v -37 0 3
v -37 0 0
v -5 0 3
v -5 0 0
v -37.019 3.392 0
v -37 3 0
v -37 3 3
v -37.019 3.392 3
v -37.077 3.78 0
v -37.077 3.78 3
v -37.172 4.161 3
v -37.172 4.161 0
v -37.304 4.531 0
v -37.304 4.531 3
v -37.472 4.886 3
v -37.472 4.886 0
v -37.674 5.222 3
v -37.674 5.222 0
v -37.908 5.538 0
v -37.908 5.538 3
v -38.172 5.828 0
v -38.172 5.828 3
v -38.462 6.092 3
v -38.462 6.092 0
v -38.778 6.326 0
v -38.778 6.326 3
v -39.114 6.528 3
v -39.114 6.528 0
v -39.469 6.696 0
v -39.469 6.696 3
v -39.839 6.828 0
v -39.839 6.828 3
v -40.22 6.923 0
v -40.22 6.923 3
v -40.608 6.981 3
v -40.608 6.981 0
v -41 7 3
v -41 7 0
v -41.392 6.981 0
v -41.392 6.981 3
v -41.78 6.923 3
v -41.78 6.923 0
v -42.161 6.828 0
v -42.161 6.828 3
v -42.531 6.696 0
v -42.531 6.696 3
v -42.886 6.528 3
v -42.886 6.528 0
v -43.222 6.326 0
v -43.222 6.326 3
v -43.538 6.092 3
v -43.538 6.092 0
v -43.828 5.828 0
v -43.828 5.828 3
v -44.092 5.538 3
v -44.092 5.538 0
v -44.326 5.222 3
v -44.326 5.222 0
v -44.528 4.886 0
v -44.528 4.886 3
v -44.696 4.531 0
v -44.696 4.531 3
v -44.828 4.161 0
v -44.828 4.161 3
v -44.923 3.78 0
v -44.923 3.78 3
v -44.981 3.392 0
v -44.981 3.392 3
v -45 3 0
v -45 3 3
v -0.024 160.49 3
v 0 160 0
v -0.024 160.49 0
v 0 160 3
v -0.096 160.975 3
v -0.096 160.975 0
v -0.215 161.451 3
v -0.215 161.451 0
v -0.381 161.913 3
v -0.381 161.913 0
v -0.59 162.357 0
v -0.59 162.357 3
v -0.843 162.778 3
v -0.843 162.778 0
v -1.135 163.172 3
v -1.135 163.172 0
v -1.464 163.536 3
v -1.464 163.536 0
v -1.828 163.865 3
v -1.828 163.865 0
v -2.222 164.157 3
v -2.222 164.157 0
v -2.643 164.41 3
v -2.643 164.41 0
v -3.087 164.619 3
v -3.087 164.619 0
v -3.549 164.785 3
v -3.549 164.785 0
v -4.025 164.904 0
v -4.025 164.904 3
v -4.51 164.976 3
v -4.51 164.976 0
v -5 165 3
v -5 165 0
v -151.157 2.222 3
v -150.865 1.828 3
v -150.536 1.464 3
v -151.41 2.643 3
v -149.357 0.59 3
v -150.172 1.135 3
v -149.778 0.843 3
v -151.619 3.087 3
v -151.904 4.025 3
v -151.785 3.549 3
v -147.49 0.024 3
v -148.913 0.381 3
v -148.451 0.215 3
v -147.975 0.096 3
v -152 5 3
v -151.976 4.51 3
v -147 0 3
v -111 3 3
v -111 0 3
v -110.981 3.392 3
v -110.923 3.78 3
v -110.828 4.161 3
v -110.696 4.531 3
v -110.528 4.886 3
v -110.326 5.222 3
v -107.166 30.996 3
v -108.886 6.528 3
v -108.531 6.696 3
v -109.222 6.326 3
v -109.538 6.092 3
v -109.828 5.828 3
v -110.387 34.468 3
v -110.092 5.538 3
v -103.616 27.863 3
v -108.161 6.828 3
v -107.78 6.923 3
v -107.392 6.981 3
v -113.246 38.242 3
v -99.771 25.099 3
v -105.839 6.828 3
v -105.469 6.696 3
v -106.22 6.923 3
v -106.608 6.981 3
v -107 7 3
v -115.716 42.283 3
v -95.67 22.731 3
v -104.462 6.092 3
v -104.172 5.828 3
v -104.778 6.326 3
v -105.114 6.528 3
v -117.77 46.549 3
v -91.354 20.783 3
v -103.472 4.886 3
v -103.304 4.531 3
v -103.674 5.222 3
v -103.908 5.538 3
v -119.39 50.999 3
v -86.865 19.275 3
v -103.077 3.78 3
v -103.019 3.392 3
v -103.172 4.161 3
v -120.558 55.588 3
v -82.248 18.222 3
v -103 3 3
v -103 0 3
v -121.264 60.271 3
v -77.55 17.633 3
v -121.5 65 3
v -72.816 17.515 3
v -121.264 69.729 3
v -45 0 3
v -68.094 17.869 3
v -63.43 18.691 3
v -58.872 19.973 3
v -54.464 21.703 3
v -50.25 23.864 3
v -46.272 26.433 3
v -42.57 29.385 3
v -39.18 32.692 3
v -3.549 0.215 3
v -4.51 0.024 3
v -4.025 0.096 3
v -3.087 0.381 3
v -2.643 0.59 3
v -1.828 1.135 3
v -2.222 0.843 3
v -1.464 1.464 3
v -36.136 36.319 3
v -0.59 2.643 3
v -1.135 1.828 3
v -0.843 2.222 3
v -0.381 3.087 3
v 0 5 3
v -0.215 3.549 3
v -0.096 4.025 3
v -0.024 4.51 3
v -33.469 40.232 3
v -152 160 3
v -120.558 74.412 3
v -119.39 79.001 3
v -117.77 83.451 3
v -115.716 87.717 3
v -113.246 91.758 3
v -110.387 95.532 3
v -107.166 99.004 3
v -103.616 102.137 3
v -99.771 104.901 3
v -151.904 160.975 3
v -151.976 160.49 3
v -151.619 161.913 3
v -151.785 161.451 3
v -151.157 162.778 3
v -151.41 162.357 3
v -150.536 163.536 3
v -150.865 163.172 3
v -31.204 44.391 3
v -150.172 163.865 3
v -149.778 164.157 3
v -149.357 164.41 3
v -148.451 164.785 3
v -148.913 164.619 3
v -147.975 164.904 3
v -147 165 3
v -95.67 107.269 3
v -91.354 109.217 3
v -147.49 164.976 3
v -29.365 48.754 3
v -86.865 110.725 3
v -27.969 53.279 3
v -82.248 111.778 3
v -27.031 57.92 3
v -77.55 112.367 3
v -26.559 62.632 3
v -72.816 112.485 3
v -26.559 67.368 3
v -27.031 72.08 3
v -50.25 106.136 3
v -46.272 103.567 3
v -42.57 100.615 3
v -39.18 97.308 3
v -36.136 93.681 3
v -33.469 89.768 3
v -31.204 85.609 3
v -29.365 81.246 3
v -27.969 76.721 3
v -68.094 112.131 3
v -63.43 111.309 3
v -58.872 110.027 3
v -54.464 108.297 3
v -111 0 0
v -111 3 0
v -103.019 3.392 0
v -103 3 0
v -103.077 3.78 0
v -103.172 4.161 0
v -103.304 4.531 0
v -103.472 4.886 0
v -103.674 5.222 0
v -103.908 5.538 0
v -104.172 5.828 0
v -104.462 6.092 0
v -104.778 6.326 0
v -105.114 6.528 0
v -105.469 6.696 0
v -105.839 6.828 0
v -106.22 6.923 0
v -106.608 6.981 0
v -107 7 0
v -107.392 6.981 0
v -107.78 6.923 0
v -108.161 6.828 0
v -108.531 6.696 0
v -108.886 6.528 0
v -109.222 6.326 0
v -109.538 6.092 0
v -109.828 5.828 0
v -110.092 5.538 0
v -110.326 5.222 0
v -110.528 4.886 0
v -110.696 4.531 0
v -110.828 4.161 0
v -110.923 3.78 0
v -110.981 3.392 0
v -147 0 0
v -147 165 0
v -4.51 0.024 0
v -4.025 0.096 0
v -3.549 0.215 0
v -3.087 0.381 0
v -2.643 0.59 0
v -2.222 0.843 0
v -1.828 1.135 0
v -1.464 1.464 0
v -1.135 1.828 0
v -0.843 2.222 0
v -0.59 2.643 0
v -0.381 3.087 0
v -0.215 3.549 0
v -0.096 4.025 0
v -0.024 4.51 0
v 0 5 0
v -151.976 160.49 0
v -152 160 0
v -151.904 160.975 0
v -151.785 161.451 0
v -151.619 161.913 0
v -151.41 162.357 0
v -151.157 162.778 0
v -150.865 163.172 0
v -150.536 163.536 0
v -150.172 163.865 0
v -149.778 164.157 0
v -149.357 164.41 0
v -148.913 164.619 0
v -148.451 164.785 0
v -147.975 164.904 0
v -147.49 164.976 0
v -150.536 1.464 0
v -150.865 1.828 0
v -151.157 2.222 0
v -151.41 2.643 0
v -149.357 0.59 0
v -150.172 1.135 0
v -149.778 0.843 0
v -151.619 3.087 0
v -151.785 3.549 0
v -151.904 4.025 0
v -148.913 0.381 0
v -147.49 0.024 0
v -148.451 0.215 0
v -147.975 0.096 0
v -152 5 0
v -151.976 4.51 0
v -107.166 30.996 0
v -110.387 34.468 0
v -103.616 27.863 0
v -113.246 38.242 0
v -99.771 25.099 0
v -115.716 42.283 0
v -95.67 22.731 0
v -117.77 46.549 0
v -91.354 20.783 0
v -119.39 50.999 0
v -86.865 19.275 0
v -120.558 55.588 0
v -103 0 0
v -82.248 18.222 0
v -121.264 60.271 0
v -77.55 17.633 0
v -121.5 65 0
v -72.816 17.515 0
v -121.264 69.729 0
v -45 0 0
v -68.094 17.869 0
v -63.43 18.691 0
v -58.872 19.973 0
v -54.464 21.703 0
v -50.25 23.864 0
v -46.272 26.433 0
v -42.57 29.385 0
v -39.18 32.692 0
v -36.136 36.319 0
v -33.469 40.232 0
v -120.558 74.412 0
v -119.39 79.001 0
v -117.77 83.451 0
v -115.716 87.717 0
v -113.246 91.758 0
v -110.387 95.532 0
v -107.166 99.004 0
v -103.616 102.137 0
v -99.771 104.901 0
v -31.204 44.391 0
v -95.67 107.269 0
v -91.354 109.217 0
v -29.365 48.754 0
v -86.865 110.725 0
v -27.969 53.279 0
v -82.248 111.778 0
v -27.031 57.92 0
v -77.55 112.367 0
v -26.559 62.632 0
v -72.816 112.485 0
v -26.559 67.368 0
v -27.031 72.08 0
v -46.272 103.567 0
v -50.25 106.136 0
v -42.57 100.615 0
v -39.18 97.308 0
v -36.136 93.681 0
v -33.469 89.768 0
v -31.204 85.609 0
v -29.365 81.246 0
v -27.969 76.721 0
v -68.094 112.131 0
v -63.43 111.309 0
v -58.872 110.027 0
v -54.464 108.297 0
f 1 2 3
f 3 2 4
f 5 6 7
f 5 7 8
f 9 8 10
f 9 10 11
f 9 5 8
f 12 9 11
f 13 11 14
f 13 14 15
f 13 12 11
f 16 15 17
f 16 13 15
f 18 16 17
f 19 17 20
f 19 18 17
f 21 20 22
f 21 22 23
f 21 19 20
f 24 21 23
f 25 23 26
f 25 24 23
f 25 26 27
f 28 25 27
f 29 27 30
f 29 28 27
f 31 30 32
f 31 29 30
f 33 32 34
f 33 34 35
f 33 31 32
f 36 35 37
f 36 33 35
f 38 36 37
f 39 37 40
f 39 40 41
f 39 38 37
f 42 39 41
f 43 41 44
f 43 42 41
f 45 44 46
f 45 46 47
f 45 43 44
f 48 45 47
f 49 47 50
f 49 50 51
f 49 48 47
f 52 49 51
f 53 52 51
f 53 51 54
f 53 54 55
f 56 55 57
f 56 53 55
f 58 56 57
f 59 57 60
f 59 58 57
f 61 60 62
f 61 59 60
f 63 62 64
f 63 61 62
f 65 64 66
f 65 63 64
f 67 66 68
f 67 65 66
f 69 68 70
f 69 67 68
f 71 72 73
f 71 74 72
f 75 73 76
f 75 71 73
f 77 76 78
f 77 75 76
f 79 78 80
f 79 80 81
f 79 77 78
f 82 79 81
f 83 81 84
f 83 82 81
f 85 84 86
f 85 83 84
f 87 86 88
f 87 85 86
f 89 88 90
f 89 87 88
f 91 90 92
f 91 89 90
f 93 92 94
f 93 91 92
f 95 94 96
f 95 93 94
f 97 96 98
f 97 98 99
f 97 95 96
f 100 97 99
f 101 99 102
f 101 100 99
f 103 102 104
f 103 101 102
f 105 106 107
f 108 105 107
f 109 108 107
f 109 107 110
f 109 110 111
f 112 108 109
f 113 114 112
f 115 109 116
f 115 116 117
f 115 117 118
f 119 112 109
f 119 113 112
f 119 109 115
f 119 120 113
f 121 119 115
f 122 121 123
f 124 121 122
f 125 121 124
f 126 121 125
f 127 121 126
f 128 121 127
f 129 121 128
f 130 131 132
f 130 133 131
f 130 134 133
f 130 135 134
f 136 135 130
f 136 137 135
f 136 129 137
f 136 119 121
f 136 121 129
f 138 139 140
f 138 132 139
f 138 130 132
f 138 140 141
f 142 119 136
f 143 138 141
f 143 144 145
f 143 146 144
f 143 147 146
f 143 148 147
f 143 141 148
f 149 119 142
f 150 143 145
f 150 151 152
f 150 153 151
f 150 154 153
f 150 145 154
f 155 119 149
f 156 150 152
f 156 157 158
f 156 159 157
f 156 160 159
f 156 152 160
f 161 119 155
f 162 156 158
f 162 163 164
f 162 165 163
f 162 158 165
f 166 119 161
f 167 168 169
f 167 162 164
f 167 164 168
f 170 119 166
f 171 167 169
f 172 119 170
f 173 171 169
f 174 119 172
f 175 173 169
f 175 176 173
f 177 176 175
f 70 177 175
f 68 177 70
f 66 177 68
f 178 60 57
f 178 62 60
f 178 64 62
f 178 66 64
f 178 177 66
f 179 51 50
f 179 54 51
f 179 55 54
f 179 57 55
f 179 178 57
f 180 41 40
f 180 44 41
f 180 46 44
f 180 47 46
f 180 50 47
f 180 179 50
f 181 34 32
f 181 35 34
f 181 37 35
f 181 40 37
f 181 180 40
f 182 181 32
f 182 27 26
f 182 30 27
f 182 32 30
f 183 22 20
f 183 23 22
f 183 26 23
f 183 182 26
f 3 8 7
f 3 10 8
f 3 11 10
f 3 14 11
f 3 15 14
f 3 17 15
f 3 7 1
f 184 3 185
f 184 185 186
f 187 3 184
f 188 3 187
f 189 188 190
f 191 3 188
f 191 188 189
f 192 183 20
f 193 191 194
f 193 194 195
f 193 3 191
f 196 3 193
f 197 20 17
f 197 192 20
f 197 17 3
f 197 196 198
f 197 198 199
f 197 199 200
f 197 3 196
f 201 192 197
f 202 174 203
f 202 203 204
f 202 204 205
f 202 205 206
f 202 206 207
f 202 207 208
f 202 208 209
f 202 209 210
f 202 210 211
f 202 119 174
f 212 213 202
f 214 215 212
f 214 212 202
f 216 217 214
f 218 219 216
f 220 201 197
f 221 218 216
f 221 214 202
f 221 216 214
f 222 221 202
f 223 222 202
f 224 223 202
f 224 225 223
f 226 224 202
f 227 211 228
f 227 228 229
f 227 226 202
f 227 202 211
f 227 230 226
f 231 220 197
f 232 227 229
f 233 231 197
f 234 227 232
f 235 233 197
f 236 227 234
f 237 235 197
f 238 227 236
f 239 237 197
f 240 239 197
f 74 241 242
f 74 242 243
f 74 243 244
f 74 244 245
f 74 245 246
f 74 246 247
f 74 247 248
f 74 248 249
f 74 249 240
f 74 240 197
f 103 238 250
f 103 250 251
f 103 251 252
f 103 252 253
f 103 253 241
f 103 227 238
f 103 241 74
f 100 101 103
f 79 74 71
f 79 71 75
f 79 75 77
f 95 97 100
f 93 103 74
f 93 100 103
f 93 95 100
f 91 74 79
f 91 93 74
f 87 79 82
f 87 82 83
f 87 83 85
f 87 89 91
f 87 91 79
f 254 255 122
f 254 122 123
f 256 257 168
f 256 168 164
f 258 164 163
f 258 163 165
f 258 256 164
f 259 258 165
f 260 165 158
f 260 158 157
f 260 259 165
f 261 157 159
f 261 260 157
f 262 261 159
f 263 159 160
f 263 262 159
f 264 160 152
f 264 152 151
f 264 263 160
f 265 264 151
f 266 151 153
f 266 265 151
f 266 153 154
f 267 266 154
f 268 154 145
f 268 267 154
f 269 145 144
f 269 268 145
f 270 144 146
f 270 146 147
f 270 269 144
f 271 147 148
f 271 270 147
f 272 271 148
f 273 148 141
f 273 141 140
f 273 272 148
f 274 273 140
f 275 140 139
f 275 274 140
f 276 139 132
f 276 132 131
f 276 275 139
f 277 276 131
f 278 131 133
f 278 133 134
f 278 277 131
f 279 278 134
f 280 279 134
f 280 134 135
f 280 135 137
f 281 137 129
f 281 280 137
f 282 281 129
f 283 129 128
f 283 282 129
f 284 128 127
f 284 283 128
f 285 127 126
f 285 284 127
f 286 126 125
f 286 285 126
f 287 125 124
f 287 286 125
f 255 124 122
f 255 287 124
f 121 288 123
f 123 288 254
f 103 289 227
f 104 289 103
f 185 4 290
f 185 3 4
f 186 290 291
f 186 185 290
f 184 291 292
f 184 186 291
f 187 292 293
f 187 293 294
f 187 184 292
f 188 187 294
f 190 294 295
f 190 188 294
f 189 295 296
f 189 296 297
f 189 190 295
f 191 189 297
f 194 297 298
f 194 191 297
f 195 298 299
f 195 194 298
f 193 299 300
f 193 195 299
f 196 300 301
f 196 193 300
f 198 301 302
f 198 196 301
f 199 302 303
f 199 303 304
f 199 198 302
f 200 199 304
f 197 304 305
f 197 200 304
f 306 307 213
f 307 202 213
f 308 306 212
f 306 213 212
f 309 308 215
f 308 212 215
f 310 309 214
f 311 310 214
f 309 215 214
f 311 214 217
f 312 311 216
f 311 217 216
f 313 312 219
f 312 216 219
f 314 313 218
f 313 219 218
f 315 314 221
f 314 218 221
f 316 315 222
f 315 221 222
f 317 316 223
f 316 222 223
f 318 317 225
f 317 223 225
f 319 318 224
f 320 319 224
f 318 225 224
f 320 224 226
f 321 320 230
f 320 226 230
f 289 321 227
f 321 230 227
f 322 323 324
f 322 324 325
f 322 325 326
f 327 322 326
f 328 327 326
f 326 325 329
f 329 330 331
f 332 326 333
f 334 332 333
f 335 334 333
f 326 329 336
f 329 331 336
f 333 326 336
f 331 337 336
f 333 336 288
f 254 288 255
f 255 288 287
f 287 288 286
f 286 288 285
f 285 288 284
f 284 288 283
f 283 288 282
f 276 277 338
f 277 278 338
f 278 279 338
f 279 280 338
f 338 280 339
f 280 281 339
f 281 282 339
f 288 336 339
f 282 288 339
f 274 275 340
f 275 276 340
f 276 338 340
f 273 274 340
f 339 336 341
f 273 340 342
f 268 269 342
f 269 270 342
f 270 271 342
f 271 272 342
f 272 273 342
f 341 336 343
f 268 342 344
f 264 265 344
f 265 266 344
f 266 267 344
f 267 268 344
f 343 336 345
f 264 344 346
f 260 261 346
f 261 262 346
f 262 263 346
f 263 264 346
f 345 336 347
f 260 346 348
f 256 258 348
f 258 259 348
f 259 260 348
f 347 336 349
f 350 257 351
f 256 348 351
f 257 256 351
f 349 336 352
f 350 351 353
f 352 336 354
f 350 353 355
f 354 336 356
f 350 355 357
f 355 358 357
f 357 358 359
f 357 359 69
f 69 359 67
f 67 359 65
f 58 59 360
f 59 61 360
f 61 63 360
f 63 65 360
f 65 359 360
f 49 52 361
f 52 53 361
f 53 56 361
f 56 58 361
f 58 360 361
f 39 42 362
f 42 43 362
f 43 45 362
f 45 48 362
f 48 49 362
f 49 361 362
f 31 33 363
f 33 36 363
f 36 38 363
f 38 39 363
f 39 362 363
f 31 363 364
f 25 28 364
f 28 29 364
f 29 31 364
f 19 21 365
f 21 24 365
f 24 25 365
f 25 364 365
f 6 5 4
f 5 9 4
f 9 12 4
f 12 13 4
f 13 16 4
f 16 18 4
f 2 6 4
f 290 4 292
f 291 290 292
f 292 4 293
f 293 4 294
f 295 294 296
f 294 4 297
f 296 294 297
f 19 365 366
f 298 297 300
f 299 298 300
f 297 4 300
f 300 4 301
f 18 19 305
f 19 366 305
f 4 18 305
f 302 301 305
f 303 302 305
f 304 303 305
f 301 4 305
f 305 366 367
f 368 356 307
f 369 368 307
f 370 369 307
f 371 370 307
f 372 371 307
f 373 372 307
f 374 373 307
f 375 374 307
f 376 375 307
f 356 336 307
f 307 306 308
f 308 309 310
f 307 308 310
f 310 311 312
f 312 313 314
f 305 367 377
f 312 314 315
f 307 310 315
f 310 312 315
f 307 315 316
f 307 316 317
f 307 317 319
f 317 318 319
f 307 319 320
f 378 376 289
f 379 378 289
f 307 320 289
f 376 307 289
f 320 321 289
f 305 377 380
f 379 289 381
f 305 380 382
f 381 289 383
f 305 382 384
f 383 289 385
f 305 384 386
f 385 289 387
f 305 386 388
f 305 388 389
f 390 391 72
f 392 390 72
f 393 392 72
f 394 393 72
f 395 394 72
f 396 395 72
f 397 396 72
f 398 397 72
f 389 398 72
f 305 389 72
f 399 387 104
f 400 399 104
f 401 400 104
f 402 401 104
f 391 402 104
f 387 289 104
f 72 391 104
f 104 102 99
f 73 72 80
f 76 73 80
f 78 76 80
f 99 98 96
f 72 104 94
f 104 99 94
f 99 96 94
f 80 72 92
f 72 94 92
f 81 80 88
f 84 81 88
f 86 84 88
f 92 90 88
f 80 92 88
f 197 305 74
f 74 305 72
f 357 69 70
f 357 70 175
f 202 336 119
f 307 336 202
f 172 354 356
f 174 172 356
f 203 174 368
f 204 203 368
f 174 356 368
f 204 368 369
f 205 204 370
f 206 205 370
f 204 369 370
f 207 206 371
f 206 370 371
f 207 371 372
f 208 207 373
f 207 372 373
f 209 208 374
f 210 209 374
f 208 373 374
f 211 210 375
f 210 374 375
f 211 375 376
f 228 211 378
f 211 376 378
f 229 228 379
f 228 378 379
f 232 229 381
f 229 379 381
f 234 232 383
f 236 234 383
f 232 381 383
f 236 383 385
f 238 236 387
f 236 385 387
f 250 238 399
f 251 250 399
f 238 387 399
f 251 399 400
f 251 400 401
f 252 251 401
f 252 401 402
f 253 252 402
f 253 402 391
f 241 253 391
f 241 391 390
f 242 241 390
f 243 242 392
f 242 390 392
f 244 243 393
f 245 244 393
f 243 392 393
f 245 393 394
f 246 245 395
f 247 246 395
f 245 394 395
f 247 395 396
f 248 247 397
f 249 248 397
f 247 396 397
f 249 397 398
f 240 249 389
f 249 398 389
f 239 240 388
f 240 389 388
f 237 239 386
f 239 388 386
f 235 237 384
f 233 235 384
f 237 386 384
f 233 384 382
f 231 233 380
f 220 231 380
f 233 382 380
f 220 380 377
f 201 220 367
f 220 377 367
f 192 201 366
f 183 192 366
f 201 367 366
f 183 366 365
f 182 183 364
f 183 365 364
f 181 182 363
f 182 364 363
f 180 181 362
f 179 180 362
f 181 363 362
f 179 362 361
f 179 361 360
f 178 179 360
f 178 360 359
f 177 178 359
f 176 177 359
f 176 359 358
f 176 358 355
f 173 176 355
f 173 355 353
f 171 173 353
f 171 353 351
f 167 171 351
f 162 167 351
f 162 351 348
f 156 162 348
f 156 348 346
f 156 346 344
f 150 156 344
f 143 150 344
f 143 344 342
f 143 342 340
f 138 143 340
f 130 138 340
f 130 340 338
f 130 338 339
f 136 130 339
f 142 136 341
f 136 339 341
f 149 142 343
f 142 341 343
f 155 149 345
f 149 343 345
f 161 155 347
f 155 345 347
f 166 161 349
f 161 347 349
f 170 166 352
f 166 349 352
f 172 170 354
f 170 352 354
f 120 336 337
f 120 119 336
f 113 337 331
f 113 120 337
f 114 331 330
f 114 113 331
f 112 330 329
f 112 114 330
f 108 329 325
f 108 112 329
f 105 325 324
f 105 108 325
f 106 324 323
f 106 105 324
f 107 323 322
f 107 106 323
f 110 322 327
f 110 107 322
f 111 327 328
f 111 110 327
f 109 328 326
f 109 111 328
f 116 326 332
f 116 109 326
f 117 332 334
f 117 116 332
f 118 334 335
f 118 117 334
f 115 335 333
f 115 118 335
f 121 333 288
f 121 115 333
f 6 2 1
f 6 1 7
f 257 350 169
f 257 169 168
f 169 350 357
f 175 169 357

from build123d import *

# Parameters (mm, degrees)
ESQUISSE1_W             = 152
ESQUISSE1_H             = 165
BOSS_EXTRU_1_DEPTH      = 3
CONG_1_R                = 5
ESQUISSE2_R             = 47.5
ENL_V_MAT_EXTRU_1_DEPTH = 3
ENL_V_MAT_EXTRU_2_DEPTH = 3


with BuildPart() as part:
    # Esquisse1 → Boss.-Extru.1 (new body)
    with BuildSketch(Plane.XY):
        with Locations((-76, 82.5)):
            Rectangle(ESQUISSE1_W, ESQUISSE1_H)
    extrude(amount=BOSS_EXTRU_1_DEPTH)

    # Congé1
    cong_1_edges = [part.edges().sort_by_distance(p)[0] for p in [
        (0, 0, 1.5),
        (-152, 0, 1.5),
        (-152, 165, 1.5),
        (0, 165, 1.5),
    ]]
    fillet(cong_1_edges, radius=CONG_1_R)

    # Esquisse2 → Enlèv. mat.-Extru.1 (cut)
    with BuildSketch(Plane(origin=(0, 0, 0), x_dir=(-1, 0, 0), z_dir=(0, 0, -1))):
        with Locations((74, 65)):
            Circle(ESQUISSE2_R)
    extrude(amount=-ENL_V_MAT_EXTRU_1_DEPTH, mode=Mode.SUBTRACT)

    # Esquisse3 → Enlèv. mat.-Extru.2 (cut)
    with BuildSketch(Plane(origin=(0, 0, 0), x_dir=(-1, 0, 0), z_dir=(0, 0, -1))):
        with BuildLine():
            Line((37, -3), (37, 3))
            ThreePointArc((37, 3), (41, 7), (45, 3))
            Line((45, 3), (45, -3))
            ThreePointArc((45, -3), (41, -7), (37, -3))
        make_face()
        with BuildLine():
            Line((103, -3), (103, 3))
            ThreePointArc((103, 3), (107, 7), (111, 3))
            Line((111, 3), (111, -3))
            ThreePointArc((111, -3), (107, -7), (103, -3))
        make_face()
    extrude(amount=-ENL_V_MAT_EXTRU_2_DEPTH, mode=Mode.SUBTRACT)


solid = part.part
